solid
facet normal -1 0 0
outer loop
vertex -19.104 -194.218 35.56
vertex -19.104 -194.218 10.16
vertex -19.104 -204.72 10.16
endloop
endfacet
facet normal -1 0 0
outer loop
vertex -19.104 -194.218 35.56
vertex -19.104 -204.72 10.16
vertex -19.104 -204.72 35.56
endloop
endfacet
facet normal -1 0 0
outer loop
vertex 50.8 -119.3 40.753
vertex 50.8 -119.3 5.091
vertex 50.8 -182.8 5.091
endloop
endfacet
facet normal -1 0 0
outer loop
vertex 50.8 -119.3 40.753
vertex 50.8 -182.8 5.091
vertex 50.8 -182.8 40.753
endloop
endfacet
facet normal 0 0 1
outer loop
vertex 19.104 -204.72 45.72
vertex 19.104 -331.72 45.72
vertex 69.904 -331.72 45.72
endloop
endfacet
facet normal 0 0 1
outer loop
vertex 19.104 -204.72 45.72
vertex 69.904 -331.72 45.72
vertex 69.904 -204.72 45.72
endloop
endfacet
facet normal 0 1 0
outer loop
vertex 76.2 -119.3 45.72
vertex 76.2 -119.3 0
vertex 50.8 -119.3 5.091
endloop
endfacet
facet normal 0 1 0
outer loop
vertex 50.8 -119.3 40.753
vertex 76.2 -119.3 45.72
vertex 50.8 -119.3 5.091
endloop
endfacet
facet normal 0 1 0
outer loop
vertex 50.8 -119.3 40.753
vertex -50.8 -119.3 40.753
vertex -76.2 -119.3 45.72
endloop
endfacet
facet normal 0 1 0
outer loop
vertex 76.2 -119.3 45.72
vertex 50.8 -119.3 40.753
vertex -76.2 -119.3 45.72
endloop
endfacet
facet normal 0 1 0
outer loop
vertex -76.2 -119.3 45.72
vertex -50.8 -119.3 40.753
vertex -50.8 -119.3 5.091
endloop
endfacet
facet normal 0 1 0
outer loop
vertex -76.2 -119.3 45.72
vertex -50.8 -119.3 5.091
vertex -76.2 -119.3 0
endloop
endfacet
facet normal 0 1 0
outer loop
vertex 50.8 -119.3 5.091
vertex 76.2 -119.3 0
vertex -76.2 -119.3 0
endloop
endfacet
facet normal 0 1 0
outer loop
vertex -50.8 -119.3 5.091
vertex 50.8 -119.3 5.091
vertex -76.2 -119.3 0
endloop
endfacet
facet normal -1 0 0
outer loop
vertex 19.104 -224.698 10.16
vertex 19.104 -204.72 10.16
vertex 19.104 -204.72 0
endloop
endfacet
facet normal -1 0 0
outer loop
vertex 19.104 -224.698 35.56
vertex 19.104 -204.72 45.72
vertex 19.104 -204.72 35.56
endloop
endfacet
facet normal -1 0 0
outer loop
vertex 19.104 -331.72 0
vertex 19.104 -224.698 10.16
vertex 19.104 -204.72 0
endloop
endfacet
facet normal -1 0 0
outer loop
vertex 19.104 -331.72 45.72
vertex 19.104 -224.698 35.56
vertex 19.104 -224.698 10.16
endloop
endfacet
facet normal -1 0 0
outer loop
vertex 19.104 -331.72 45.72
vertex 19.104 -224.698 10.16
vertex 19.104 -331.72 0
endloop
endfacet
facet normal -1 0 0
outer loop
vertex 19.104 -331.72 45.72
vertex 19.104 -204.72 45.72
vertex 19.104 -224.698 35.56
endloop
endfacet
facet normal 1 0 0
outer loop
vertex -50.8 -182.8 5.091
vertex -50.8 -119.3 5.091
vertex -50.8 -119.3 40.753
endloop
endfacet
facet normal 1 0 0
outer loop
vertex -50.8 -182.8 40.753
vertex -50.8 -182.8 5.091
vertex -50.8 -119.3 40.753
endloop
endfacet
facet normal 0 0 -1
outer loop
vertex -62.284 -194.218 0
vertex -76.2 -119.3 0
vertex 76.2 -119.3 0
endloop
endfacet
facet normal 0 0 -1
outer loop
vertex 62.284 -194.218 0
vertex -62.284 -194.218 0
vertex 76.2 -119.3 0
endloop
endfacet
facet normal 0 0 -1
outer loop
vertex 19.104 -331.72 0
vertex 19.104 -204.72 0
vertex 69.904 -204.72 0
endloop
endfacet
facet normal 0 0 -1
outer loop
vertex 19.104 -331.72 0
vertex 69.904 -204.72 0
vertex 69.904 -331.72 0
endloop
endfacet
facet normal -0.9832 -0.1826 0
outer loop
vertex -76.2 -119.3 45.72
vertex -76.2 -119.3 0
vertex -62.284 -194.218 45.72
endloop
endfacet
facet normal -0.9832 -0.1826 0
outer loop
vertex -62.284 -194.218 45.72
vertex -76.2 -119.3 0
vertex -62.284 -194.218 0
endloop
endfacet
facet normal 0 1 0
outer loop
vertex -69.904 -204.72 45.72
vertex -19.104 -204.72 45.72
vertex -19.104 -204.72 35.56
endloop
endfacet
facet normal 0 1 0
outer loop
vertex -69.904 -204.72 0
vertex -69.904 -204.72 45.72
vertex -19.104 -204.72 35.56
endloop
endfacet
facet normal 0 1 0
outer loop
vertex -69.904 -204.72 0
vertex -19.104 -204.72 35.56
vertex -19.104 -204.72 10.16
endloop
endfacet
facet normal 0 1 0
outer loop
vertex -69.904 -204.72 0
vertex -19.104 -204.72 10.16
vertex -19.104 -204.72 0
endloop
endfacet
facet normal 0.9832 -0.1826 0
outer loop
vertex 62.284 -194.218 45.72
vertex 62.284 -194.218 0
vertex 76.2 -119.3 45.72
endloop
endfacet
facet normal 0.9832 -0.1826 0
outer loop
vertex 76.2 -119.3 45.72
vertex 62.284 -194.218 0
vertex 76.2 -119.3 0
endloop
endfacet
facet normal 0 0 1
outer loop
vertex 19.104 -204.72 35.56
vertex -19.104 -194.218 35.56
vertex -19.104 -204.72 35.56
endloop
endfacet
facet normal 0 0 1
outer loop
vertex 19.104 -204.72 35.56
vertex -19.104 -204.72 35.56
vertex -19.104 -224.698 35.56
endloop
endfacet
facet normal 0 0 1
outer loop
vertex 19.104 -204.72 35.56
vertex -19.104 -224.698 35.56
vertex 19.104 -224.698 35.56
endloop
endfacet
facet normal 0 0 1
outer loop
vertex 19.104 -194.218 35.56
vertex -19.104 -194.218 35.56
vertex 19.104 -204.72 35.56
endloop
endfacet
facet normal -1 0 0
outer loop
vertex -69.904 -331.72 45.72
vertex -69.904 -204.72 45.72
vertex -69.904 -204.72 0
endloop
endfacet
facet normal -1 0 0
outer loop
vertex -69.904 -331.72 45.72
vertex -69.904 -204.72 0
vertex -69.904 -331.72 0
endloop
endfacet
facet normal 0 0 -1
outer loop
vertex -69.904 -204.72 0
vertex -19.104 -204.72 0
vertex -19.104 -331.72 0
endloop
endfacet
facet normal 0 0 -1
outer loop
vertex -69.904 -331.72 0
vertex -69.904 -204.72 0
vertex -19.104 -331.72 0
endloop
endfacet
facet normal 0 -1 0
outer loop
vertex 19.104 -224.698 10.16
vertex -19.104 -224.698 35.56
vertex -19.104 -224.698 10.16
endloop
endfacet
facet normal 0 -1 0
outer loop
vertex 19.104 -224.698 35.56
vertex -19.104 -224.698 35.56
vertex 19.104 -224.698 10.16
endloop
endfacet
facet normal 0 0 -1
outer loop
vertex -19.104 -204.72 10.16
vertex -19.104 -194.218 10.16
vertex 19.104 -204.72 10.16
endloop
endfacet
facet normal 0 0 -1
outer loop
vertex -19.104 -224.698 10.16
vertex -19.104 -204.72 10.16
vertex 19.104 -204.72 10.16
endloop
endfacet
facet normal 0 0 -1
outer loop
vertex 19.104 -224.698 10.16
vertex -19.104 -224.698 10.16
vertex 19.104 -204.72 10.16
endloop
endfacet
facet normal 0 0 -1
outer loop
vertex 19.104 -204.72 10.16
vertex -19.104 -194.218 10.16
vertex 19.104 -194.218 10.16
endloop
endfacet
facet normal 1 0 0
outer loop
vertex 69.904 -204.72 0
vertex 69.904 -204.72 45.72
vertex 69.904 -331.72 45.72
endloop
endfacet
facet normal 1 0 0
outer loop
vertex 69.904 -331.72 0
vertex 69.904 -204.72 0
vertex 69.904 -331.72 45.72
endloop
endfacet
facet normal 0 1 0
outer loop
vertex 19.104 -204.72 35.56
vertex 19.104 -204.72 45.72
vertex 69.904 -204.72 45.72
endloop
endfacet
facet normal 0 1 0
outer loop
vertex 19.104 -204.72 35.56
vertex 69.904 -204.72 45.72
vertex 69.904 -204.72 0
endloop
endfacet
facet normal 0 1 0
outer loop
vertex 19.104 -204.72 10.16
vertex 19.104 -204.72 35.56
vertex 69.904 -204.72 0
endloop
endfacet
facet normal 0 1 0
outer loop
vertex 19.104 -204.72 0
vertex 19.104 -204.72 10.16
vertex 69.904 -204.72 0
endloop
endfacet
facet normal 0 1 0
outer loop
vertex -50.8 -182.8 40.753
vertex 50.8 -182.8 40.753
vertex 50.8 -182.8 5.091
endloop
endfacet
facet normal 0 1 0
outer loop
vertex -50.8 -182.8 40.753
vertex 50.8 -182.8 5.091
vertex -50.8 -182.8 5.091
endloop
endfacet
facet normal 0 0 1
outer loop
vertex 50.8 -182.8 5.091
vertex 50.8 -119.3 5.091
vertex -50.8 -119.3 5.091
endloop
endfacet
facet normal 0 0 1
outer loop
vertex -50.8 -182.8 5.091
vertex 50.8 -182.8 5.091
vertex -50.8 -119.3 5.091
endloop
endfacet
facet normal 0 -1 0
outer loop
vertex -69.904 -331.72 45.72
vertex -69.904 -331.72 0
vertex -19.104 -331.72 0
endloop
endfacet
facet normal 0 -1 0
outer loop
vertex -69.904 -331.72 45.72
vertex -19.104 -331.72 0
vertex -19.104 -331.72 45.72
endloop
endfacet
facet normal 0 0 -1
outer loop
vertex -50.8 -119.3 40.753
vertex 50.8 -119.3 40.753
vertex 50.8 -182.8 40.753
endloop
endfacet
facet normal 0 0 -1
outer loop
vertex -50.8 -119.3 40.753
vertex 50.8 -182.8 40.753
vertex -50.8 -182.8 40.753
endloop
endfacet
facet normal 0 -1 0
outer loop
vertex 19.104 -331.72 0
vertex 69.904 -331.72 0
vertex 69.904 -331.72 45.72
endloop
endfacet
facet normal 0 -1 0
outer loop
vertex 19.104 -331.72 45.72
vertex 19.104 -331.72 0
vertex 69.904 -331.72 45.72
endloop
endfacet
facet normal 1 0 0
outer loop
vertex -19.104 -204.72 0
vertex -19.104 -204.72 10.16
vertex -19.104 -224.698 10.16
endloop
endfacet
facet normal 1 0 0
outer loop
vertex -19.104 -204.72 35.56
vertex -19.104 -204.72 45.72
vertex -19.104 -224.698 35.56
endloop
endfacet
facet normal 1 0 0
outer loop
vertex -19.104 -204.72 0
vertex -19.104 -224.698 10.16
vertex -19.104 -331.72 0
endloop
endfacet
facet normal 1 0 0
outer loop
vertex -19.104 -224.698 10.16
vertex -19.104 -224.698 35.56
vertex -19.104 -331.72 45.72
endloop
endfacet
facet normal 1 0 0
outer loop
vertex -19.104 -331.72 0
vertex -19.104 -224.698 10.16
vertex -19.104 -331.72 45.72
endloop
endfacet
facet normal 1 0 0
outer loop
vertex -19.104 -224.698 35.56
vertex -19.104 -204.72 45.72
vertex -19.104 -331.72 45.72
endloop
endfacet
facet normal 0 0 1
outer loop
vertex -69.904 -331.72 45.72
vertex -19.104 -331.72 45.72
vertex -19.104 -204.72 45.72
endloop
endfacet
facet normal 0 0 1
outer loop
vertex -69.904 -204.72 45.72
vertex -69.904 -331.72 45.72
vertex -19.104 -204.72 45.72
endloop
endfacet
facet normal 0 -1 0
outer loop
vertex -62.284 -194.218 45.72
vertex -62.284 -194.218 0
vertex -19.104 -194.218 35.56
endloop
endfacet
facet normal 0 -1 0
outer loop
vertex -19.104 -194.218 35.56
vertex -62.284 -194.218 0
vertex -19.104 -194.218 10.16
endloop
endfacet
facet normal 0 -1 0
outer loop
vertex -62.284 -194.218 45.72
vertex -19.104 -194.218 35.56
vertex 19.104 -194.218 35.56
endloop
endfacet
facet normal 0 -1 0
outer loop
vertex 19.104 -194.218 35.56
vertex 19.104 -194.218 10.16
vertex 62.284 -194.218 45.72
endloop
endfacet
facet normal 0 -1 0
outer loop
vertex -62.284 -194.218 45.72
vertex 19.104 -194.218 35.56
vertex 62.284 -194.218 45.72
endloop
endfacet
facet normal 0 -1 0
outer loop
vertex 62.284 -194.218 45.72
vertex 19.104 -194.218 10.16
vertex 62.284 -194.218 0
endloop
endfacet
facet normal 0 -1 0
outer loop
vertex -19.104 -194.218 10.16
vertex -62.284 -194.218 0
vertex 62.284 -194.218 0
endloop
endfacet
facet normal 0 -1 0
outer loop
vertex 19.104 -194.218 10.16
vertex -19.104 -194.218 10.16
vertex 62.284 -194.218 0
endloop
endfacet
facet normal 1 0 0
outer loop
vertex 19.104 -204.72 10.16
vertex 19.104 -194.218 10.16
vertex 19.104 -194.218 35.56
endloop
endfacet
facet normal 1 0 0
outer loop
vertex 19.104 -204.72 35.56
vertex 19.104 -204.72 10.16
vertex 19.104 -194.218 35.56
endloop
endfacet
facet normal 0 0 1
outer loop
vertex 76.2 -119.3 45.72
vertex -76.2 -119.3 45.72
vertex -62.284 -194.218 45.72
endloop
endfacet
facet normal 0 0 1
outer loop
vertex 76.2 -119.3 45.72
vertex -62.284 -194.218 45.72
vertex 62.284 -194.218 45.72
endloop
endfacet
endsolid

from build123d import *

# Parameters (mm, degrees)
F1_DEPTH = 45.72
F2_W     = 101.6
F2_H     = 35.6616
F3_DEPTH = 63.5
F4_W     = 38.2081334517
F4_H     = 25.4
F5_DEPTH = 30.48
F6_W     = 19.9782385411
F6_H     = 25.4
F7_DEPTH = 50.8


with BuildPart() as f1:
    # F0 (on Top) → F1 (new body)
    with BuildSketch(Plane.XY):
        Polygon((0, -119.299590295), (-50.8, -119.299590295), (-76.2, -119.299590295), (-62.2840667259, -194.2181247248), (62.2840667259, -194.2181247248), (76.2, -119.299590295), (50.8, -119.299590295), align=None)
    extrude(amount=F1_DEPTH)

    # F2 (on face) → F3 (cut)
    with BuildSketch(Plane(origin=(0, -119.299590295, 0), x_dir=(-1, 0, 0), z_dir=(0, 1, 0))):
        with Locations((0, 22.9217616037)):
            Rectangle(F2_W, F2_H)
    extrude(amount=-F3_DEPTH, mode=Mode.SUBTRACT)

    # F4 (on face) → F5 (join)
    with BuildSketch(Plane.XZ.offset(194.2181247248)):
        with Locations((1.7259e-06, 22.86)):
            Rectangle(F4_W, F4_H)
    extrude(amount=F5_DEPTH)

    # F6 (on face) → F7 (join)
    with BuildSketch(Plane(origin=(-19.104065, 0, 0), x_dir=(0, -1, 0), z_dir=(-1, 0, 0))):
        with Locations((214.7090054543, 22.86)):
            Rectangle(F6_W, F6_H)
        Polygon((204.7198861837, 10.16), (204.7198861837, 0), (331.7198861837, 0), (331.7198861837, 45.72), (204.7198861837, 45.72), (204.7198861837, 35.56), (224.6981247248, 35.56), (224.6981247248, 10.16), align=None)
    extrude(amount=F7_DEPTH)

    # F8: F1 across plane


with BuildPart() as f1_1:
    add(f1.part)
    add(f1.part.mirror(Plane.YZ))


solid = f1_1.part
